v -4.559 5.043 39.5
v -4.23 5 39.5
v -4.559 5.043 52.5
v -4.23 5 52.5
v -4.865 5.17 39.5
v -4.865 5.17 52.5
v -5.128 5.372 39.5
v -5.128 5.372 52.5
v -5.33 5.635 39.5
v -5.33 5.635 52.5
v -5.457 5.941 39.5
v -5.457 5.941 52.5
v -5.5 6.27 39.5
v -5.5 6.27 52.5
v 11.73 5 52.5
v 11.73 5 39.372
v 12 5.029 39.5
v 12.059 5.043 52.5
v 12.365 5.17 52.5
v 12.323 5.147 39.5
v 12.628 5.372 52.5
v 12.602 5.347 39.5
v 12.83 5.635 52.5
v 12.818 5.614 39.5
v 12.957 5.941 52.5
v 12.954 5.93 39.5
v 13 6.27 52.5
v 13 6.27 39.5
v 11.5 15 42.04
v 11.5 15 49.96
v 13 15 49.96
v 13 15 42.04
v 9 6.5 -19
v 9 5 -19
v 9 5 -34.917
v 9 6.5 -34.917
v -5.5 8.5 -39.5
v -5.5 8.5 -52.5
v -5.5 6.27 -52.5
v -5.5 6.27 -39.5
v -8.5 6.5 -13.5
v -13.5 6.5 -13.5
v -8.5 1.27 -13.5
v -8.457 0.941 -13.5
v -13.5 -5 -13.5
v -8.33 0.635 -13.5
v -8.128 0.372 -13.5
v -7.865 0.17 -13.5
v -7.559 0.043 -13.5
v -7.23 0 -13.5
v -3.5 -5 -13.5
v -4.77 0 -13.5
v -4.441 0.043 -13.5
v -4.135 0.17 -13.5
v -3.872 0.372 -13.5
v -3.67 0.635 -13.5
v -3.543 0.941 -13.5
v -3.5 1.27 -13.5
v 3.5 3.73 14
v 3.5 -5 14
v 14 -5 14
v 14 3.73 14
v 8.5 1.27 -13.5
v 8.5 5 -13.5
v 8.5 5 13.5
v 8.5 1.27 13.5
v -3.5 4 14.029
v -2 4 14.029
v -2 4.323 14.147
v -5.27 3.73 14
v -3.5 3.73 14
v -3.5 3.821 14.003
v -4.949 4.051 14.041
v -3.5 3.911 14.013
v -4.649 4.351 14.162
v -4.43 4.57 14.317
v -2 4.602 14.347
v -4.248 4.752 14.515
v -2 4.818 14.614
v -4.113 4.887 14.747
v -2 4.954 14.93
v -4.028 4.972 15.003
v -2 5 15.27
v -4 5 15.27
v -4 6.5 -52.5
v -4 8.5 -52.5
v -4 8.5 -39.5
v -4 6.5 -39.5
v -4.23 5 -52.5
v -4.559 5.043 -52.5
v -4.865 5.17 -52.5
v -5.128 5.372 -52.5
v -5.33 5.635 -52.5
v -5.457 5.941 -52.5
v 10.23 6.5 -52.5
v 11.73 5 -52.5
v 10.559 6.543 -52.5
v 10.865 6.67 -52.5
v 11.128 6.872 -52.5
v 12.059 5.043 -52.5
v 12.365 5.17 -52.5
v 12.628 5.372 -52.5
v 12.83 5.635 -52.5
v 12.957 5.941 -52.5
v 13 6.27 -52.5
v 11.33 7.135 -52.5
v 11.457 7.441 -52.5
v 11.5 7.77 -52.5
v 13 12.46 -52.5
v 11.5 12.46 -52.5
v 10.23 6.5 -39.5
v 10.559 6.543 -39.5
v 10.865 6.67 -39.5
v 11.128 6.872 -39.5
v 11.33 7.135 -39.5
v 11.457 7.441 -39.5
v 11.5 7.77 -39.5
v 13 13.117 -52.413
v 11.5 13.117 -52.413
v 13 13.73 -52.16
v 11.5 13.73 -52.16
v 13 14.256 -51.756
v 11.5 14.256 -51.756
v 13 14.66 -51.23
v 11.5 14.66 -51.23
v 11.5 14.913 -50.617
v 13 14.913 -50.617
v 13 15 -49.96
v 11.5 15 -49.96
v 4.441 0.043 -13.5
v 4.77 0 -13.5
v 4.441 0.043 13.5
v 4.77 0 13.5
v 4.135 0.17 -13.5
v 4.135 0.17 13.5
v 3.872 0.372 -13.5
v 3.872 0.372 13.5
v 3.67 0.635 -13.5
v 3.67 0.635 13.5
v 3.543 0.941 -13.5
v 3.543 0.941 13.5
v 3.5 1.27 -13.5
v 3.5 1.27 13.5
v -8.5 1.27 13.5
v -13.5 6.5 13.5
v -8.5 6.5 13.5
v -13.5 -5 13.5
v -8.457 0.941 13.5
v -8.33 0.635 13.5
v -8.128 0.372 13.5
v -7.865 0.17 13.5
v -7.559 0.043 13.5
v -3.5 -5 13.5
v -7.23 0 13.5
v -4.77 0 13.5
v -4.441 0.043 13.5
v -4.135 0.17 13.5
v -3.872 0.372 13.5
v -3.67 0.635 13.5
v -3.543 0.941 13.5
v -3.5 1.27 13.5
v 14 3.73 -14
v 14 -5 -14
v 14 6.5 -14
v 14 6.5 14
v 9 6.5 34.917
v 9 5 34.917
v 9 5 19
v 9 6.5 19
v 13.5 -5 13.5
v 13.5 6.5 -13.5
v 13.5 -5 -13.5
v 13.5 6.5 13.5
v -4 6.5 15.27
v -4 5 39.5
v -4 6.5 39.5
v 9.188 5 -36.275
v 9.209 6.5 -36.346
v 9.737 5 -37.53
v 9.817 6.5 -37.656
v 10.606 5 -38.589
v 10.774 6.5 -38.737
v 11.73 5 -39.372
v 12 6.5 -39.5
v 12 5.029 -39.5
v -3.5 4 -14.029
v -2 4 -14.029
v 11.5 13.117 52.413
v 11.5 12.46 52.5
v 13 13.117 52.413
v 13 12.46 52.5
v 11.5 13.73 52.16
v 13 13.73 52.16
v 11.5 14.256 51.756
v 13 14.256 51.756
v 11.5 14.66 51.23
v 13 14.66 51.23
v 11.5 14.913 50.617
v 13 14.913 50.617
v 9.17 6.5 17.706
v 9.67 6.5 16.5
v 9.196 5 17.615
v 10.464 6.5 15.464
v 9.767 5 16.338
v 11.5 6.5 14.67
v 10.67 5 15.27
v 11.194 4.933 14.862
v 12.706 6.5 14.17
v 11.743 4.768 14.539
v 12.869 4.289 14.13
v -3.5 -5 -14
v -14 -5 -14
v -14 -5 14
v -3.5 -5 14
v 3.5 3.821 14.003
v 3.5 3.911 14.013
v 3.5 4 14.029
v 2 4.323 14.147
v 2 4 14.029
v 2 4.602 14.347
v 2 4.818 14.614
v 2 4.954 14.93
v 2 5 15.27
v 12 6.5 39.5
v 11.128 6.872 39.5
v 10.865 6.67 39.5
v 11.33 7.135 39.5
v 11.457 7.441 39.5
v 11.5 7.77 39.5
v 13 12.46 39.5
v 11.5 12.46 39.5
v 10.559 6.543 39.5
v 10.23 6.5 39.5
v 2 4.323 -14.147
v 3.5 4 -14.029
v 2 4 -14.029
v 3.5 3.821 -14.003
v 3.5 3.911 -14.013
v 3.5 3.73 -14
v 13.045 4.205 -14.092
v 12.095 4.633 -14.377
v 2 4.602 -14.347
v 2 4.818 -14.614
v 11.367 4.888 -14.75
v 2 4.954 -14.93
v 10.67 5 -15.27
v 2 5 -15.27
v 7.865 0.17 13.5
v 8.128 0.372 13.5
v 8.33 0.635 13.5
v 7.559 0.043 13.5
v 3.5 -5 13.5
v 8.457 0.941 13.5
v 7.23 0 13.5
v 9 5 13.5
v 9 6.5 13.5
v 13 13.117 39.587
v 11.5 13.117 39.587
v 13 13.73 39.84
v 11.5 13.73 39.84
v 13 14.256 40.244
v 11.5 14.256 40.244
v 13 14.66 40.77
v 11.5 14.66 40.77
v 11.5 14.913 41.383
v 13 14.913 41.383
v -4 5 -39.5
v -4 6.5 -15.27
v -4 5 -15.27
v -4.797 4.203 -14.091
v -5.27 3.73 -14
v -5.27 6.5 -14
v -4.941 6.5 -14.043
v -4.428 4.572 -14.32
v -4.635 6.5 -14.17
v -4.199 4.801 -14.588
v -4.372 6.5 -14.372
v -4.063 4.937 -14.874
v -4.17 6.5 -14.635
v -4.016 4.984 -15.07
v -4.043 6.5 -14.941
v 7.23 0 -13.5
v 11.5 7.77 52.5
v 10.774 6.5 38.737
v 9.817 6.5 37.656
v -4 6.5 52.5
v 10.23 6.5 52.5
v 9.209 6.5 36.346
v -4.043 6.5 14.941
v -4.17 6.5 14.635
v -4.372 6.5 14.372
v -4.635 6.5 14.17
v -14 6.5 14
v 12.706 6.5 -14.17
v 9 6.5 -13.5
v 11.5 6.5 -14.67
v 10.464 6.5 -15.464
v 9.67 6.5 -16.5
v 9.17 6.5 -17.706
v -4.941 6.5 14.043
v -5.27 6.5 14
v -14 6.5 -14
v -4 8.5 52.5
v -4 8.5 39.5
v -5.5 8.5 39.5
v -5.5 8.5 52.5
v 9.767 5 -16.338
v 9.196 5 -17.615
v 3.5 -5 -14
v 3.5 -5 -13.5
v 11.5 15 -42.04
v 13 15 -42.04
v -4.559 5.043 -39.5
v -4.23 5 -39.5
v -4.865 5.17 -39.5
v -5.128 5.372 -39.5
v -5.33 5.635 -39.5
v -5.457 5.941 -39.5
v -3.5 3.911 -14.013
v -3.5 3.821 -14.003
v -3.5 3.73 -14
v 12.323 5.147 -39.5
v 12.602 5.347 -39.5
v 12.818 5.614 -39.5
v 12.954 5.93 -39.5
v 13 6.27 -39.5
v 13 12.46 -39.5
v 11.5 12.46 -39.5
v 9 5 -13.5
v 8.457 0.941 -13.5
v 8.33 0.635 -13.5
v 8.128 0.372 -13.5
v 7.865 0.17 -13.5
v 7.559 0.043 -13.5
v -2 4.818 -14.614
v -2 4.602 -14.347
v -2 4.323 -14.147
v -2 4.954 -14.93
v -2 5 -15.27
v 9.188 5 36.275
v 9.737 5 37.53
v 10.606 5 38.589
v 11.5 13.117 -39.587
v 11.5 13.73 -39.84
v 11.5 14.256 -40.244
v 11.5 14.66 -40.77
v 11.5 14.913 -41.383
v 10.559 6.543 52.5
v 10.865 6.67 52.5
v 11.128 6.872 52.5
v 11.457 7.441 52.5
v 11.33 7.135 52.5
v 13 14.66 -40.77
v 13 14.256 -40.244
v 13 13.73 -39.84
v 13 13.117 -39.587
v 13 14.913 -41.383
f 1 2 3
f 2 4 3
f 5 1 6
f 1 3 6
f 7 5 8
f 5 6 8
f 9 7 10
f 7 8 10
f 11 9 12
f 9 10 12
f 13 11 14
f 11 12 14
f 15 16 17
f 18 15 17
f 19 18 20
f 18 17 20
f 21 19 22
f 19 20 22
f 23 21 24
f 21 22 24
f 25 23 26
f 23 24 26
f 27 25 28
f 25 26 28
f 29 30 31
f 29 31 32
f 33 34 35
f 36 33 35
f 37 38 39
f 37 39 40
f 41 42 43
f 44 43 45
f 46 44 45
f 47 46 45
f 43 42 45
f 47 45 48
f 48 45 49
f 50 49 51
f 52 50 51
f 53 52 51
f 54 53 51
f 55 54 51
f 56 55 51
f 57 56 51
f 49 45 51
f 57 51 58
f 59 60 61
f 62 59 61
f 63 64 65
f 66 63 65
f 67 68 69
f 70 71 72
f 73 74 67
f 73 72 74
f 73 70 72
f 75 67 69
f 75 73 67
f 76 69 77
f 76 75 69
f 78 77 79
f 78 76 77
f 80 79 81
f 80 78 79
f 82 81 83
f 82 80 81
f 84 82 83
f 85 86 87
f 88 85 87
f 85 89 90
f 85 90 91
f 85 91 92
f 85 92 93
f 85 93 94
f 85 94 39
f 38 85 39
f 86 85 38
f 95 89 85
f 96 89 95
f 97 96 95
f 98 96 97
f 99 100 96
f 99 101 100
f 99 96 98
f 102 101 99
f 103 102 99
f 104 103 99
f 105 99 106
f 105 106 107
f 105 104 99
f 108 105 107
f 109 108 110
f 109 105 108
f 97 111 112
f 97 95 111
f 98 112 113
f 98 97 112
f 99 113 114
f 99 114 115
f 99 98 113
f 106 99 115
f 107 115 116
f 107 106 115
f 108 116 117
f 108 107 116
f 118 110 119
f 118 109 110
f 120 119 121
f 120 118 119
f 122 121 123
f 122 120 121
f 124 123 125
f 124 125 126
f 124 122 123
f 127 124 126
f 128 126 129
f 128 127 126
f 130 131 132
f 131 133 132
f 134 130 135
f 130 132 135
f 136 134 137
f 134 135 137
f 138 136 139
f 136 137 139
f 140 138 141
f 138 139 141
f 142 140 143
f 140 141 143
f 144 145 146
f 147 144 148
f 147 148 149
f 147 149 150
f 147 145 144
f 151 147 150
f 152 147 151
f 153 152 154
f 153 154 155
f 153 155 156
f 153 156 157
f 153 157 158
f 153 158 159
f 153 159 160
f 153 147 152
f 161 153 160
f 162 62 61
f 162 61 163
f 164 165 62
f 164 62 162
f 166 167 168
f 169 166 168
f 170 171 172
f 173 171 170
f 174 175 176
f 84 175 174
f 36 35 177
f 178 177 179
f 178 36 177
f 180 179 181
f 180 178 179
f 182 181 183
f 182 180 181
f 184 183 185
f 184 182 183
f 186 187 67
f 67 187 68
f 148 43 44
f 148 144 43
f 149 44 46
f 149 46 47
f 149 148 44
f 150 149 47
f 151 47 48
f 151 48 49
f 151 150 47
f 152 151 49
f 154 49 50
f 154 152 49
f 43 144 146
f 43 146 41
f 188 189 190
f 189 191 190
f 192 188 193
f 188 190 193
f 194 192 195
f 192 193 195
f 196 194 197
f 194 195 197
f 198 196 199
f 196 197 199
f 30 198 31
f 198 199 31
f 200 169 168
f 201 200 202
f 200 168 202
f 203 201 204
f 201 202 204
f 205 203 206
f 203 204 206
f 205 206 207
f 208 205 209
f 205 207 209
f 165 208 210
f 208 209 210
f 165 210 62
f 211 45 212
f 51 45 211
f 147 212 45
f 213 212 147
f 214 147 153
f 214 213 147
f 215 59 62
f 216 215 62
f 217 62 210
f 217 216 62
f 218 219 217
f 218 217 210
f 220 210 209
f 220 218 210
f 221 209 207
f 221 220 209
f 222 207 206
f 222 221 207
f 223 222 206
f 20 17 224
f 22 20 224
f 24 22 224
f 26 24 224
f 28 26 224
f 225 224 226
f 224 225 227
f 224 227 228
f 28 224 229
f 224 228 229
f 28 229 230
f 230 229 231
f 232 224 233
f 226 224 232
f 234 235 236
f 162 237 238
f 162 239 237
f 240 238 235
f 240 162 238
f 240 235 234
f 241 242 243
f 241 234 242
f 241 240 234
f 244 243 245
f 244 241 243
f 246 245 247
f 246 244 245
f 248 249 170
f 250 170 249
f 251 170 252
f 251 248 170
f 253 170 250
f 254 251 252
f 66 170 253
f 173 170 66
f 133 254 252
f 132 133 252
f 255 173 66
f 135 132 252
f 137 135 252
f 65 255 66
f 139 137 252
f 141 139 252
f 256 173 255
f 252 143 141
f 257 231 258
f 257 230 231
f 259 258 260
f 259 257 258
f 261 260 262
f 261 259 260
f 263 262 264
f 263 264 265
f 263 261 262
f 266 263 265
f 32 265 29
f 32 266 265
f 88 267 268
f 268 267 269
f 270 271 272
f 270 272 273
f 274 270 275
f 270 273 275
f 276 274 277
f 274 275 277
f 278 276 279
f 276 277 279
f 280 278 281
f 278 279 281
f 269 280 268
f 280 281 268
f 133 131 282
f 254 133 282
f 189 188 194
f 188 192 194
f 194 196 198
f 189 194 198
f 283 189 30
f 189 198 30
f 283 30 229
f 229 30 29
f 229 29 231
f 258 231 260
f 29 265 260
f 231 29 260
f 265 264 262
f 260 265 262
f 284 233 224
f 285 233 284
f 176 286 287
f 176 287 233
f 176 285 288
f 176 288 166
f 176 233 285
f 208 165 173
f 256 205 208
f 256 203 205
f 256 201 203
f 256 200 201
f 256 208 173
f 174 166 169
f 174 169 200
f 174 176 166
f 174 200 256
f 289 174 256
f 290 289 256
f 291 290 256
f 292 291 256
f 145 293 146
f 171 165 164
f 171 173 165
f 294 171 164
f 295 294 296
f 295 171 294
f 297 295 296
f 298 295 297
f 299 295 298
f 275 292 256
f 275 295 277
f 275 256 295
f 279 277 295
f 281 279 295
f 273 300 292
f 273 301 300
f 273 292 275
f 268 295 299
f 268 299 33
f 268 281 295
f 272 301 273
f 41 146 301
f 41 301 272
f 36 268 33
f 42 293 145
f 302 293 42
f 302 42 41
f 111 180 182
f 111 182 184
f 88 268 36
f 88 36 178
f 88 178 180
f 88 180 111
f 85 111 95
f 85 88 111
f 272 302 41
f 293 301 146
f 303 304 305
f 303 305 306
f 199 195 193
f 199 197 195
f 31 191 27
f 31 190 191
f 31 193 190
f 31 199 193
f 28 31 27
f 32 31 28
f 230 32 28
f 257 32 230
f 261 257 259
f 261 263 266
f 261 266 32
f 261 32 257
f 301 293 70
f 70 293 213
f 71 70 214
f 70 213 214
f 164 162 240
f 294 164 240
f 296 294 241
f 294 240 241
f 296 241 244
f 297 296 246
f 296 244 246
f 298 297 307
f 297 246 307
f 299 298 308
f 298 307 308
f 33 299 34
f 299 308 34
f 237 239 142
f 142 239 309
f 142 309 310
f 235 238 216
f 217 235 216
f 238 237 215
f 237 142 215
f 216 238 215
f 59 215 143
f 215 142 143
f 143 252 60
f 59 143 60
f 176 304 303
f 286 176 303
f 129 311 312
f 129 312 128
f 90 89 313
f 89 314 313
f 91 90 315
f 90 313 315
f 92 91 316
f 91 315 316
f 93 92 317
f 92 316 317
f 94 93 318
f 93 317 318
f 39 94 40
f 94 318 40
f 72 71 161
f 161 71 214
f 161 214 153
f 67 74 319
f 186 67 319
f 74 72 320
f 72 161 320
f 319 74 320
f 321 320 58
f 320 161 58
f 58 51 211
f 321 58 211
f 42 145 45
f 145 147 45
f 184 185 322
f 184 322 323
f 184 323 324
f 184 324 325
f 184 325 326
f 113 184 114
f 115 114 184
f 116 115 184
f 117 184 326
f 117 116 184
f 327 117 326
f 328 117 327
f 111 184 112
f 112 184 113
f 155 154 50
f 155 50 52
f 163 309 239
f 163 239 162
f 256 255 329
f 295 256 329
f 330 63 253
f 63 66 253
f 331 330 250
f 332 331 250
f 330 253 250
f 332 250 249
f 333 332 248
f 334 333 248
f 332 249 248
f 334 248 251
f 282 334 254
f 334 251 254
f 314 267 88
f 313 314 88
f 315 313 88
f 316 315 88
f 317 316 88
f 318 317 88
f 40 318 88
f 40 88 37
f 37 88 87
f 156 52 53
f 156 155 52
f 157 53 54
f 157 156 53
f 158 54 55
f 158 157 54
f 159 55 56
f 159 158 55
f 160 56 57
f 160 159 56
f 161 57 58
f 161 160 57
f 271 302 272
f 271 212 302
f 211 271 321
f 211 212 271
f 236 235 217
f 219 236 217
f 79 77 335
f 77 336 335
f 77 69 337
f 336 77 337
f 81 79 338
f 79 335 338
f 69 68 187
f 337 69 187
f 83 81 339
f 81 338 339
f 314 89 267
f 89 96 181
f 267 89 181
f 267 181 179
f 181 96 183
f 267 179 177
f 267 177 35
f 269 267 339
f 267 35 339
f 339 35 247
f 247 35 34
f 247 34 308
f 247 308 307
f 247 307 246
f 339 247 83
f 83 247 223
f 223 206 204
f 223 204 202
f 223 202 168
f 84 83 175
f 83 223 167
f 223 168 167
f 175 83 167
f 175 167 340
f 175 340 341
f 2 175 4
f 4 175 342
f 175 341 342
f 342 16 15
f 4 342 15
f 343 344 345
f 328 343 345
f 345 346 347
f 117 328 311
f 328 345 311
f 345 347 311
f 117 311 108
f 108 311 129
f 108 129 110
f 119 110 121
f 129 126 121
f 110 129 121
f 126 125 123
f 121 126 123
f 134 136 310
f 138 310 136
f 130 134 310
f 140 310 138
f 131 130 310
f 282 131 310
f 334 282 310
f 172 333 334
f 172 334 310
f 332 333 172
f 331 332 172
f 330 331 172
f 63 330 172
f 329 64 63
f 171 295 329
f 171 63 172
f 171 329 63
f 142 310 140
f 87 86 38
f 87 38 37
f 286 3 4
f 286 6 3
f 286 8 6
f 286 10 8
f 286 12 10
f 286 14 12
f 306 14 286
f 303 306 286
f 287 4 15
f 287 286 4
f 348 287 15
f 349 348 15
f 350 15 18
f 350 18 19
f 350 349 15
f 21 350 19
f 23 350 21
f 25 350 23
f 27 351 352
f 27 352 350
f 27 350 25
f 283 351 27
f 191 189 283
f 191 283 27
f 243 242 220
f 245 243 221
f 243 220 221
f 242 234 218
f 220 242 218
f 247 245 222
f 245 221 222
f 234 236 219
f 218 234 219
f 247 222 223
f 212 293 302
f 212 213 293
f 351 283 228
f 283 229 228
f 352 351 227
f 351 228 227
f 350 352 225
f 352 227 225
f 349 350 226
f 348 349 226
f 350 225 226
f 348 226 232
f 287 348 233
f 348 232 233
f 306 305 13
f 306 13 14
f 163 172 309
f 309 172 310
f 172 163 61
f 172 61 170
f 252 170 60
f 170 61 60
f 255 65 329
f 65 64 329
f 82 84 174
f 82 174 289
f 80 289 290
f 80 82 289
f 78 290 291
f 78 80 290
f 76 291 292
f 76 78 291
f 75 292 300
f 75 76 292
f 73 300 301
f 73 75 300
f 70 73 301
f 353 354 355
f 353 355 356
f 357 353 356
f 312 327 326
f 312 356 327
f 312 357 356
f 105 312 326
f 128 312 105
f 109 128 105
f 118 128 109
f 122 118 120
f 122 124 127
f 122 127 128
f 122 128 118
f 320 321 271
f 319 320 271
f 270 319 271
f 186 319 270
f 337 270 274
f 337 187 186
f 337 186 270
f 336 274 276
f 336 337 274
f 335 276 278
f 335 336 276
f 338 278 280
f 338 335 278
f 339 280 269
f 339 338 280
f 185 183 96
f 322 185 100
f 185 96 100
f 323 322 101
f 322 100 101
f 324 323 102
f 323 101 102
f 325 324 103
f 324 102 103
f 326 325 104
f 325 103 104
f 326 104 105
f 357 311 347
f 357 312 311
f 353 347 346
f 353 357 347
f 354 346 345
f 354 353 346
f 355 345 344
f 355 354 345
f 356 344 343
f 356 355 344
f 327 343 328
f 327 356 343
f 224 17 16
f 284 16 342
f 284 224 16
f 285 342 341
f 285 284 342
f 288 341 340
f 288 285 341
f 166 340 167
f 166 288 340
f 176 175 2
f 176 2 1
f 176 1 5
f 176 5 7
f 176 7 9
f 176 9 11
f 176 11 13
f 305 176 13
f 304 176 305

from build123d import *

# Parameters (mm, degrees)
SKETCH1_W                 = 28
SKETCH1_H                 = 28
SKETCH1_W_2               = 27
SKETCH1_H_2               = 27
BOSS_EXTRUDE1_DEPTH       = 5
SKETCH2_W                 = 27
SKETCH2_H                 = 27
BOSS_EXTRUDE2_DEPTH       = 1
SKETCH4_W                 = 7
SKETCH4_H                 = 0.5
CUT_EXTRUDE1_DEPTH        = 4
CUT_EXTRUDE2_DEPTH        = 21.199009877
CUT_EXTRUDE2_DEPTH_BACK   = 21.199009877
SKETCH5_W                 = 5
SKETCH5_H                 = 27
SKETCH7_W                 = 5
SKETCH7_H                 = 27
BOSS_EXTRUDE3_DEPTH       = 4
BOSS_EXTRUDE4_DEPTH       = 5
BOSS_EXTRUDE5_DEPTH       = 5
SKETCH10_W                = 13
SKETCH10_H                = 105
BOSS_EXTRUDE6_DEPTH       = 1.5
SKETCH11_W                = 10
SKETCH11_H                = 28
SKETCH11_W_2              = 5
SKETCH11_H_2              = 27
BOSS_EXTRUDE7_DEPTH       = 1.5
SKETCH12_W                = 3
SKETCH12_H                = 13
BOSS_EXTRUDE8_DEPTH       = 1.5
SKETCH14_W                = 3
SKETCH14_H                = 13
BOSS_EXTRUDE9_DEPTH       = 1.5
FILLET1_R                 = 5
BOSS_EXTRUDE10_DEPTH      = 1
BOSS_EXTRUDE10_DEPTH_BACK = 0.5
SKETCH15_W                = 13
SKETCH15_H                = 10.000000066
FILLET2_R                 = 1.27
FILLET3_R                 = 1.27
FILLET4_R                 = 1.27
FILLET5_R                 = 1.27
SKETCH16_W                = 13
SKETCH16_H                = 3.5
BOSS_EXTRUDE11_DEPTH      = 1.5
FILLET6_R                 = 1.27
FILLET7_R                 = 1.27
FILLET8_R                 = 2.54
CUT_EXTRUDE3_DEPTH        = 1


with BuildPart() as part:
    # Sketch1 → Boss-Extrude1 (new body)
    with BuildSketch(Plane(origin=(0, 0, 0), x_dir=(1, 0, 0), z_dir=(0, 1, 0))):
        Rectangle(SKETCH1_W, SKETCH1_H)
        Rectangle(SKETCH1_W_2, SKETCH1_H_2, mode=Mode.SUBTRACT)
    extrude(amount=BOSS_EXTRUDE1_DEPTH)

    # Sketch4 → Cut-Extrude1 (cut)
    with BuildSketch(Plane.XZ):
        with Locations((0, 13.75)):
            Rectangle(SKETCH4_W, SKETCH4_H)
        with Locations((0, -13.75)):
            Rectangle(SKETCH4_W, SKETCH4_H)
    extrude(amount=-CUT_EXTRUDE1_DEPTH, mode=Mode.SUBTRACT)



with BuildPart() as body_2:
    # Sketch2 → Boss-Extrude2 (new body)
    with BuildSketch(Plane(origin=(0, 5, 0), x_dir=(1, 0, 0), z_dir=(0, 1, 0))):
        Rectangle(SKETCH2_W, SKETCH2_H)
    extrude(amount=-BOSS_EXTRUDE2_DEPTH)

    # Sketch5 → Cut-Extrude2 (cut, two sides: drawn at the far end of the back side and taken through both)
    with BuildSketch(Plane.XZ.offset(-4).offset(-CUT_EXTRUDE2_DEPTH_BACK)):
        with Locations((-11, 0)):
            Rectangle(SKETCH5_W, SKETCH5_H)
        with Locations((11, 0)):
            Rectangle(SKETCH5_W, SKETCH5_H)
    extrude(amount=CUT_EXTRUDE2_DEPTH + CUT_EXTRUDE2_DEPTH_BACK, mode=Mode.SUBTRACT)


with BuildPart() as part_1:
    add(part.part)

    add(body_2.part)  # Boss-Extrude3 merges body 2
    # Sketch7 → Boss-Extrude3 (add)
    with BuildSketch(Plane.XZ.offset(-4)):
        with Locations((-6, 0)):
            Rectangle(SKETCH7_W, SKETCH7_H)
        with Locations((6, 0)):
            Rectangle(SKETCH7_W, SKETCH7_H)
    extrude(amount=BOSS_EXTRUDE3_DEPTH)

    # Sketch8 → Boss-Extrude4 (add)
    with BuildSketch(Plane.XZ):
        Polygon((-13.5, -13.5), (-13.5, 13.5), (-3.5, 13.5), (-3.5, 14), (-14, 14), (-14, -14), (-3.5, -14), (-3.5, -13.5), align=None)
    extrude(amount=BOSS_EXTRUDE4_DEPTH)

    # Sketch9 → Boss-Extrude5 (add)
    with BuildSketch(Plane.XZ):
        Polygon((3.5, 14), (14, 14), (14, -14), (3.5, -14), (3.5, -13.5), (13.5, -13.5), (13.5, 13.5), (3.5, 13.5), align=None)
    extrude(amount=BOSS_EXTRUDE5_DEPTH)

    # Sketch10 → Boss-Extrude6 (add)
    with BuildSketch(Plane(origin=(0, 5, 0), x_dir=(1, 0, 0), z_dir=(0, 1, 0))):
        with Locations((2.5, 0)):
            Rectangle(SKETCH10_W, SKETCH10_H)
    extrude(amount=BOSS_EXTRUDE6_DEPTH)

    # Sketch11 → Boss-Extrude7 (add)
    # profile 1 of 2: a face of its own
    with BuildSketch(Plane(origin=(0, 5, 0), x_dir=(1, 0, 0), z_dir=(0, 1, 0))):
        with Locations((-9, 0)):
            Rectangle(SKETCH11_W, SKETCH11_H)
        with Locations((-11, 0)):
            Rectangle(SKETCH11_W_2, SKETCH11_H_2, mode=Mode.SUBTRACT)
    # profile 2 of 2: a face of its own
    with BuildSketch(Plane(origin=(0, 5, 0), x_dir=(1, 0, 0), z_dir=(0, 1, 0))):
        Polygon((9, 13.5), (9, 14), (14, 14), (14, -14), (9, -14), (9, -13.5), (13.5, -13.5), (13.5, 13.5), align=None)
    extrude(amount=BOSS_EXTRUDE7_DEPTH)

    # Sketch12 → Boss-Extrude8 (add)
    with BuildSketch(Plane(origin=(0, 6.5, 0), x_dir=(1, 0, 0), z_dir=(0, 1, 0))):
        with Locations((10.5, -46)):
            Rectangle(SKETCH12_W, SKETCH12_H)
    extrude(amount=-BOSS_EXTRUDE8_DEPTH)

    # Sketch14 → Boss-Extrude9 (add)
    with BuildSketch(Plane(origin=(0, 6.5, 0), x_dir=(1, 0, 0), z_dir=(0, 1, 0))):
        with Locations((10.5, 46)):
            Rectangle(SKETCH14_W, SKETCH14_H)
    extrude(amount=-BOSS_EXTRUDE9_DEPTH)

    # Fillet1
    # the kernel refuses this fillet: 5 mm, written as the material it adds along each edge
    with BuildSketch(Plane(origin=(9, 6.5, 39.5), x_dir=(0, 0, -1), z_dir=(0, -1, 0))) as fillet1_piece_1:
        with BuildLine():
            CenterArc((4.582575695, 5), FILLET1_R, 203.578178478, 66.421821522)
            Line((0, 3), (-0.091651514, 2.96))
            ThreePointArc((-0.091651514, 2.96), (-0.1, 1.5), (-0.1, 0))
            Line((-0.1, 0), (0, -0.1))
            Line((0, -0.1), (4.582575695, -0.1))
            Line((4.582575695, -0.1), (4.582575695, 0))
        make_face()
    extrude(amount=1.5)
    with BuildSketch(Plane(origin=(9, 5, 14), x_dir=(1, 0, 0), z_dir=(0, 1, 0))) as fillet1_piece_2:
        with BuildLine():
            CenterArc((FILLET1_R, -FILLET1_R), FILLET1_R, 90, 90)
            Line((0, -FILLET1_R), (-FILLET1_R * 0.02, -FILLET1_R))
            Line((-FILLET1_R * 0.02, -FILLET1_R), (-FILLET1_R * 0.02, FILLET1_R * 0.02))
            Line((-FILLET1_R * 0.02, FILLET1_R * 0.02), (FILLET1_R, FILLET1_R * 0.02))
            Line((FILLET1_R, FILLET1_R * 0.02), (FILLET1_R, 0))
        make_face()
    extrude(amount=1.5)
    with BuildSketch(Plane(origin=(9, 5, -14), x_dir=(1, 0, 0), z_dir=(0, 1, 0))) as fillet1_piece_3:
        with BuildLine():
            CenterArc((FILLET1_R, FILLET1_R), FILLET1_R, 180, 90)
            Line((0, FILLET1_R), (-FILLET1_R * 0.02, FILLET1_R))
            Line((-FILLET1_R * 0.02, FILLET1_R), (-FILLET1_R * 0.02, -FILLET1_R * 0.02))
            Line((-FILLET1_R * 0.02, -FILLET1_R * 0.02), (FILLET1_R, -FILLET1_R * 0.02))
            Line((FILLET1_R, -FILLET1_R * 0.02), (FILLET1_R, 0))
        make_face()
    extrude(amount=1.5)
    with BuildSketch(Plane(origin=(9, 6.5, -39.5), x_dir=(0, 0, 1), z_dir=(0, -1, 0))) as fillet1_piece_4:
        with BuildLine():
            CenterArc((4.582575695, -5), FILLET1_R, 90, 66.421821522)
            Line((0, -3), (-0.091651514, -2.96))
            ThreePointArc((-0.091651514, -2.96), (-0.1, -1.5), (-0.1, 0))
            Line((-0.1, 0), (0, 0.1))
            Line((0, 0.1), (4.582575695, 0.1))
            Line((4.582575695, 0.1), (4.582575695, 0))
        make_face()
    extrude(amount=1.5)

    # Sketch15 → Boss-Extrude10 (add, two sides: drawn at the far end of the back side and taken through both)
    with BuildSketch(Plane(origin=(12, 0, 0), x_dir=(0, 0, -1), z_dir=(1, 0, 0)).offset(-BOSS_EXTRUDE10_DEPTH_BACK)):
        with Locations((46, 10.000000033)):
            Rectangle(SKETCH15_W, SKETCH15_H)
        with Locations((-46, 10.000000033)):
            Rectangle(SKETCH15_W, SKETCH15_H)
    extrude(amount=BOSS_EXTRUDE10_DEPTH + BOSS_EXTRUDE10_DEPTH_BACK)

    # Fillet2
    fillet2_edges = [part_1.edges().sort_by_distance(p)[0] for p in [
        (11.5, 6.5, -46),
        (11.5, 6.5, 46),
    ]]
    fillet(fillet2_edges, radius=FILLET2_R)

    # Fillet3
    # the kernel refuses this fillet: 1.27 mm, written as the material it adds along each edge
    with BuildSketch(Plane(origin=(-4, 5, 14), x_dir=(0, 0, 1), z_dir=(1, 0, 0))) as fillet3_piece_1_section:
        with BuildLine():
            CenterArc((FILLET3_R, FILLET3_R), FILLET3_R, 180, 90)
            Line((0, FILLET3_R), (0, 0))
            Line((0, 0), (FILLET3_R, 0))
        make_face()
    fillet3_piece_1 = extrude(amount=18, mode=Mode.PRIVATE)
    fillet3_piece_1 = fillet3_piece_1 - Plane(origin=(14, 4.722255872, 19), x_dir=(1, 0, 0), z_dir=(0, -1, 0)) * Cylinder(5, 42, mode=Mode.PRIVATE)
    fillet3_piece_1 = split(fillet3_piece_1, bisect_by=Plane(origin=(-3.75, 4, 14.285759195), z_dir=(0, 1, 0)), keep=Keep.TOP, mode=Mode.PRIVATE)
    add(fillet3_piece_1)
    with BuildSketch(Plane(origin=(-4, 5, 14), x_dir=(0, 0, 1), z_dir=(1, 0, 0))) as fillet3_piece_2_section:
        with BuildLine():
            CenterArc((FILLET3_R, FILLET3_R), FILLET3_R, 180, 90)
            Line((0, FILLET3_R), (0, 0))
            Line((0, 0), (FILLET3_R, 0))
        make_face()
    fillet3_piece_2 = extrude(amount=21.175, mode=Mode.PRIVATE)
    fillet3_piece_2 = split(fillet3_piece_2, bisect_by=Plane(origin=(-3.5, 3.932655267, 14.008692454), z_dir=(-1, 0, 0)), keep=Keep.TOP, mode=Mode.PRIVATE)
    add(fillet3_piece_2)
    with BuildSketch(Plane(origin=(-7.175, 5, 14), x_dir=(0, 0, 1), z_dir=(1, 0, 0))) as fillet3_piece_3_section:
        with BuildLine():
            CenterArc((FILLET3_R, FILLET3_R), FILLET3_R, 180, 90)
            Line((0, FILLET3_R), (0, 0))
            Line((0, 0), (FILLET3_R, 0))
        make_face()
    fillet3_piece_3 = extrude(amount=21.175, mode=Mode.PRIVATE)
    fillet3_piece_3 = fillet3_piece_3 - Plane(origin=(14, 3.932300045, 19), x_dir=(1, 0, 0), z_dir=(0, -1, 0)) * Cylinder(5, 48, mode=Mode.PRIVATE)
    fillet3_piece_3 = split(fillet3_piece_3, bisect_by=Plane(origin=(3.5, 3.932300045, 14.008616185), z_dir=(1, 0, 0)), keep=Keep.TOP, mode=Mode.PRIVATE)
    add(fillet3_piece_3)
    with BuildSketch(Plane(origin=(14, 5, -14), x_dir=(0, 0, -1), z_dir=(-1, 0, 0))) as fillet3_piece_4_section:
        with BuildLine():
            CenterArc((FILLET3_R, FILLET3_R), FILLET3_R, 180, 90)
            Line((0, FILLET3_R), (0, 0))
            Line((0, 0), (FILLET3_R, 0))
        make_face()
    fillet3_piece_4 = extrude(amount=18, mode=Mode.PRIVATE)
    fillet3_piece_4 = fillet3_piece_4 - Plane(origin=(14, 4.711484111, -19), x_dir=(1, 0, 0), z_dir=(0, -1, 0)) * Cylinder(5, 42, mode=Mode.PRIVATE)
    fillet3_piece_4 = split(fillet3_piece_4, bisect_by=Plane(origin=(8.027122346, 4, -14.26821747), z_dir=(0, 1, 0)), keep=Keep.TOP, mode=Mode.PRIVATE)
    add(fillet3_piece_4)
    with BuildSketch(Plane(origin=(14, 5, -14), x_dir=(0, 0, -1), z_dir=(-1, 0, 0))) as fillet3_piece_5_section:
        with BuildLine():
            CenterArc((FILLET3_R, FILLET3_R), FILLET3_R, 180, 90)
            Line((0, FILLET3_R), (0, 0))
            Line((0, 0), (FILLET3_R, 0))
        make_face()
    fillet3_piece_5 = extrude(amount=21.175, mode=Mode.PRIVATE)
    fillet3_piece_5 = fillet3_piece_5 - Plane(origin=(14, 3.932300045, -19), x_dir=(1, 0, 0), z_dir=(0, -1, 0)) * Cylinder(5, 48, mode=Mode.PRIVATE)
    fillet3_piece_5 = split(fillet3_piece_5, bisect_by=Plane(origin=(3.5, 3.932300045, -14.008616185), z_dir=(1, 0, 0)), keep=Keep.TOP, mode=Mode.PRIVATE)
    add(fillet3_piece_5)
    with BuildSketch(Plane(origin=(17.175, 5, -14), x_dir=(0, 0, -1), z_dir=(-1, 0, 0))) as fillet3_piece_6_section:
        with BuildLine():
            CenterArc((FILLET3_R, FILLET3_R), FILLET3_R, 180, 90)
            Line((0, FILLET3_R), (0, 0))
            Line((0, 0), (FILLET3_R, 0))
        make_face()
    fillet3_piece_6 = extrude(amount=21.175, mode=Mode.PRIVATE)
    fillet3_piece_6 = split(fillet3_piece_6, bisect_by=Plane(origin=(-3.5, 3.932655267, -14.008692454), z_dir=(-1, 0, 0)), keep=Keep.TOP, mode=Mode.PRIVATE)
    add(fillet3_piece_6)

    # Fillet4
    fillet4_edges = [part_1.edges().sort_by_distance(p)[0] for p in [
        (-3.5, 0, 0),
        (3.5, 0, 0),
        (-8.5, 0, 0),
        (8.5, 0, 0),
    ]]
    fillet(fillet4_edges, radius=FILLET4_R)

    # Fillet5
    fillet5_edges = [part_1.edges().sort_by_distance(p)[0] for p in [
        (-4, 5.115, -14),
        (-4, 5.115, 14),
    ]]
    fillet(fillet5_edges, radius=FILLET5_R)

    # Sketch16 → Boss-Extrude11 (add)
    with BuildSketch(Plane.ZY.offset(4)):
        with Locations((-46, 6.75)):
            Rectangle(SKETCH16_W, SKETCH16_H)
        with Locations((46, 6.75)):
            Rectangle(SKETCH16_W, SKETCH16_H)
    extrude(amount=BOSS_EXTRUDE11_DEPTH)

    # Fillet6
    fillet6_edges = [part_1.edges().sort_by_distance(p)[0] for p in [
        (-5.5, 5, 46),
        (-5.5, 5, -46),
    ]]
    fillet(fillet6_edges, radius=FILLET6_R)

    # Fillet7
    fillet7_edges = [part_1.edges().sort_by_distance(p)[0] for p in [
        (13, 5, 46),
        (13, 5, -46),
    ]]
    fillet(fillet7_edges, radius=FILLET7_R)

    # Fillet8
    fillet8_edges = [part_1.edges().sort_by_distance(p)[0] for p in [
        (12.25, 15.000000066, -52.5),
        (12.25, 15.000000066, -39.5),
        (12.25, 15.000000066, 39.5),
        (12.25, 15.000000066, 52.5),
    ]]
    fillet(fillet8_edges, radius=FILLET8_R)

    # Sketch17 → Cut-Extrude3 (cut)
    with BuildSketch(Plane.XZ.offset(-4)):
        Polygon((-2, 14.029032635), (-2, -14.029032635), (-2, -17.474025738), (2, -17.474025738), (2, -14.029032635), (2, 14.029032635), (2, 17.175749071), (-2, 17.175749071), align=None)
    extrude(amount=-CUT_EXTRUDE3_DEPTH, mode=Mode.SUBTRACT)


solid = part_1.part
